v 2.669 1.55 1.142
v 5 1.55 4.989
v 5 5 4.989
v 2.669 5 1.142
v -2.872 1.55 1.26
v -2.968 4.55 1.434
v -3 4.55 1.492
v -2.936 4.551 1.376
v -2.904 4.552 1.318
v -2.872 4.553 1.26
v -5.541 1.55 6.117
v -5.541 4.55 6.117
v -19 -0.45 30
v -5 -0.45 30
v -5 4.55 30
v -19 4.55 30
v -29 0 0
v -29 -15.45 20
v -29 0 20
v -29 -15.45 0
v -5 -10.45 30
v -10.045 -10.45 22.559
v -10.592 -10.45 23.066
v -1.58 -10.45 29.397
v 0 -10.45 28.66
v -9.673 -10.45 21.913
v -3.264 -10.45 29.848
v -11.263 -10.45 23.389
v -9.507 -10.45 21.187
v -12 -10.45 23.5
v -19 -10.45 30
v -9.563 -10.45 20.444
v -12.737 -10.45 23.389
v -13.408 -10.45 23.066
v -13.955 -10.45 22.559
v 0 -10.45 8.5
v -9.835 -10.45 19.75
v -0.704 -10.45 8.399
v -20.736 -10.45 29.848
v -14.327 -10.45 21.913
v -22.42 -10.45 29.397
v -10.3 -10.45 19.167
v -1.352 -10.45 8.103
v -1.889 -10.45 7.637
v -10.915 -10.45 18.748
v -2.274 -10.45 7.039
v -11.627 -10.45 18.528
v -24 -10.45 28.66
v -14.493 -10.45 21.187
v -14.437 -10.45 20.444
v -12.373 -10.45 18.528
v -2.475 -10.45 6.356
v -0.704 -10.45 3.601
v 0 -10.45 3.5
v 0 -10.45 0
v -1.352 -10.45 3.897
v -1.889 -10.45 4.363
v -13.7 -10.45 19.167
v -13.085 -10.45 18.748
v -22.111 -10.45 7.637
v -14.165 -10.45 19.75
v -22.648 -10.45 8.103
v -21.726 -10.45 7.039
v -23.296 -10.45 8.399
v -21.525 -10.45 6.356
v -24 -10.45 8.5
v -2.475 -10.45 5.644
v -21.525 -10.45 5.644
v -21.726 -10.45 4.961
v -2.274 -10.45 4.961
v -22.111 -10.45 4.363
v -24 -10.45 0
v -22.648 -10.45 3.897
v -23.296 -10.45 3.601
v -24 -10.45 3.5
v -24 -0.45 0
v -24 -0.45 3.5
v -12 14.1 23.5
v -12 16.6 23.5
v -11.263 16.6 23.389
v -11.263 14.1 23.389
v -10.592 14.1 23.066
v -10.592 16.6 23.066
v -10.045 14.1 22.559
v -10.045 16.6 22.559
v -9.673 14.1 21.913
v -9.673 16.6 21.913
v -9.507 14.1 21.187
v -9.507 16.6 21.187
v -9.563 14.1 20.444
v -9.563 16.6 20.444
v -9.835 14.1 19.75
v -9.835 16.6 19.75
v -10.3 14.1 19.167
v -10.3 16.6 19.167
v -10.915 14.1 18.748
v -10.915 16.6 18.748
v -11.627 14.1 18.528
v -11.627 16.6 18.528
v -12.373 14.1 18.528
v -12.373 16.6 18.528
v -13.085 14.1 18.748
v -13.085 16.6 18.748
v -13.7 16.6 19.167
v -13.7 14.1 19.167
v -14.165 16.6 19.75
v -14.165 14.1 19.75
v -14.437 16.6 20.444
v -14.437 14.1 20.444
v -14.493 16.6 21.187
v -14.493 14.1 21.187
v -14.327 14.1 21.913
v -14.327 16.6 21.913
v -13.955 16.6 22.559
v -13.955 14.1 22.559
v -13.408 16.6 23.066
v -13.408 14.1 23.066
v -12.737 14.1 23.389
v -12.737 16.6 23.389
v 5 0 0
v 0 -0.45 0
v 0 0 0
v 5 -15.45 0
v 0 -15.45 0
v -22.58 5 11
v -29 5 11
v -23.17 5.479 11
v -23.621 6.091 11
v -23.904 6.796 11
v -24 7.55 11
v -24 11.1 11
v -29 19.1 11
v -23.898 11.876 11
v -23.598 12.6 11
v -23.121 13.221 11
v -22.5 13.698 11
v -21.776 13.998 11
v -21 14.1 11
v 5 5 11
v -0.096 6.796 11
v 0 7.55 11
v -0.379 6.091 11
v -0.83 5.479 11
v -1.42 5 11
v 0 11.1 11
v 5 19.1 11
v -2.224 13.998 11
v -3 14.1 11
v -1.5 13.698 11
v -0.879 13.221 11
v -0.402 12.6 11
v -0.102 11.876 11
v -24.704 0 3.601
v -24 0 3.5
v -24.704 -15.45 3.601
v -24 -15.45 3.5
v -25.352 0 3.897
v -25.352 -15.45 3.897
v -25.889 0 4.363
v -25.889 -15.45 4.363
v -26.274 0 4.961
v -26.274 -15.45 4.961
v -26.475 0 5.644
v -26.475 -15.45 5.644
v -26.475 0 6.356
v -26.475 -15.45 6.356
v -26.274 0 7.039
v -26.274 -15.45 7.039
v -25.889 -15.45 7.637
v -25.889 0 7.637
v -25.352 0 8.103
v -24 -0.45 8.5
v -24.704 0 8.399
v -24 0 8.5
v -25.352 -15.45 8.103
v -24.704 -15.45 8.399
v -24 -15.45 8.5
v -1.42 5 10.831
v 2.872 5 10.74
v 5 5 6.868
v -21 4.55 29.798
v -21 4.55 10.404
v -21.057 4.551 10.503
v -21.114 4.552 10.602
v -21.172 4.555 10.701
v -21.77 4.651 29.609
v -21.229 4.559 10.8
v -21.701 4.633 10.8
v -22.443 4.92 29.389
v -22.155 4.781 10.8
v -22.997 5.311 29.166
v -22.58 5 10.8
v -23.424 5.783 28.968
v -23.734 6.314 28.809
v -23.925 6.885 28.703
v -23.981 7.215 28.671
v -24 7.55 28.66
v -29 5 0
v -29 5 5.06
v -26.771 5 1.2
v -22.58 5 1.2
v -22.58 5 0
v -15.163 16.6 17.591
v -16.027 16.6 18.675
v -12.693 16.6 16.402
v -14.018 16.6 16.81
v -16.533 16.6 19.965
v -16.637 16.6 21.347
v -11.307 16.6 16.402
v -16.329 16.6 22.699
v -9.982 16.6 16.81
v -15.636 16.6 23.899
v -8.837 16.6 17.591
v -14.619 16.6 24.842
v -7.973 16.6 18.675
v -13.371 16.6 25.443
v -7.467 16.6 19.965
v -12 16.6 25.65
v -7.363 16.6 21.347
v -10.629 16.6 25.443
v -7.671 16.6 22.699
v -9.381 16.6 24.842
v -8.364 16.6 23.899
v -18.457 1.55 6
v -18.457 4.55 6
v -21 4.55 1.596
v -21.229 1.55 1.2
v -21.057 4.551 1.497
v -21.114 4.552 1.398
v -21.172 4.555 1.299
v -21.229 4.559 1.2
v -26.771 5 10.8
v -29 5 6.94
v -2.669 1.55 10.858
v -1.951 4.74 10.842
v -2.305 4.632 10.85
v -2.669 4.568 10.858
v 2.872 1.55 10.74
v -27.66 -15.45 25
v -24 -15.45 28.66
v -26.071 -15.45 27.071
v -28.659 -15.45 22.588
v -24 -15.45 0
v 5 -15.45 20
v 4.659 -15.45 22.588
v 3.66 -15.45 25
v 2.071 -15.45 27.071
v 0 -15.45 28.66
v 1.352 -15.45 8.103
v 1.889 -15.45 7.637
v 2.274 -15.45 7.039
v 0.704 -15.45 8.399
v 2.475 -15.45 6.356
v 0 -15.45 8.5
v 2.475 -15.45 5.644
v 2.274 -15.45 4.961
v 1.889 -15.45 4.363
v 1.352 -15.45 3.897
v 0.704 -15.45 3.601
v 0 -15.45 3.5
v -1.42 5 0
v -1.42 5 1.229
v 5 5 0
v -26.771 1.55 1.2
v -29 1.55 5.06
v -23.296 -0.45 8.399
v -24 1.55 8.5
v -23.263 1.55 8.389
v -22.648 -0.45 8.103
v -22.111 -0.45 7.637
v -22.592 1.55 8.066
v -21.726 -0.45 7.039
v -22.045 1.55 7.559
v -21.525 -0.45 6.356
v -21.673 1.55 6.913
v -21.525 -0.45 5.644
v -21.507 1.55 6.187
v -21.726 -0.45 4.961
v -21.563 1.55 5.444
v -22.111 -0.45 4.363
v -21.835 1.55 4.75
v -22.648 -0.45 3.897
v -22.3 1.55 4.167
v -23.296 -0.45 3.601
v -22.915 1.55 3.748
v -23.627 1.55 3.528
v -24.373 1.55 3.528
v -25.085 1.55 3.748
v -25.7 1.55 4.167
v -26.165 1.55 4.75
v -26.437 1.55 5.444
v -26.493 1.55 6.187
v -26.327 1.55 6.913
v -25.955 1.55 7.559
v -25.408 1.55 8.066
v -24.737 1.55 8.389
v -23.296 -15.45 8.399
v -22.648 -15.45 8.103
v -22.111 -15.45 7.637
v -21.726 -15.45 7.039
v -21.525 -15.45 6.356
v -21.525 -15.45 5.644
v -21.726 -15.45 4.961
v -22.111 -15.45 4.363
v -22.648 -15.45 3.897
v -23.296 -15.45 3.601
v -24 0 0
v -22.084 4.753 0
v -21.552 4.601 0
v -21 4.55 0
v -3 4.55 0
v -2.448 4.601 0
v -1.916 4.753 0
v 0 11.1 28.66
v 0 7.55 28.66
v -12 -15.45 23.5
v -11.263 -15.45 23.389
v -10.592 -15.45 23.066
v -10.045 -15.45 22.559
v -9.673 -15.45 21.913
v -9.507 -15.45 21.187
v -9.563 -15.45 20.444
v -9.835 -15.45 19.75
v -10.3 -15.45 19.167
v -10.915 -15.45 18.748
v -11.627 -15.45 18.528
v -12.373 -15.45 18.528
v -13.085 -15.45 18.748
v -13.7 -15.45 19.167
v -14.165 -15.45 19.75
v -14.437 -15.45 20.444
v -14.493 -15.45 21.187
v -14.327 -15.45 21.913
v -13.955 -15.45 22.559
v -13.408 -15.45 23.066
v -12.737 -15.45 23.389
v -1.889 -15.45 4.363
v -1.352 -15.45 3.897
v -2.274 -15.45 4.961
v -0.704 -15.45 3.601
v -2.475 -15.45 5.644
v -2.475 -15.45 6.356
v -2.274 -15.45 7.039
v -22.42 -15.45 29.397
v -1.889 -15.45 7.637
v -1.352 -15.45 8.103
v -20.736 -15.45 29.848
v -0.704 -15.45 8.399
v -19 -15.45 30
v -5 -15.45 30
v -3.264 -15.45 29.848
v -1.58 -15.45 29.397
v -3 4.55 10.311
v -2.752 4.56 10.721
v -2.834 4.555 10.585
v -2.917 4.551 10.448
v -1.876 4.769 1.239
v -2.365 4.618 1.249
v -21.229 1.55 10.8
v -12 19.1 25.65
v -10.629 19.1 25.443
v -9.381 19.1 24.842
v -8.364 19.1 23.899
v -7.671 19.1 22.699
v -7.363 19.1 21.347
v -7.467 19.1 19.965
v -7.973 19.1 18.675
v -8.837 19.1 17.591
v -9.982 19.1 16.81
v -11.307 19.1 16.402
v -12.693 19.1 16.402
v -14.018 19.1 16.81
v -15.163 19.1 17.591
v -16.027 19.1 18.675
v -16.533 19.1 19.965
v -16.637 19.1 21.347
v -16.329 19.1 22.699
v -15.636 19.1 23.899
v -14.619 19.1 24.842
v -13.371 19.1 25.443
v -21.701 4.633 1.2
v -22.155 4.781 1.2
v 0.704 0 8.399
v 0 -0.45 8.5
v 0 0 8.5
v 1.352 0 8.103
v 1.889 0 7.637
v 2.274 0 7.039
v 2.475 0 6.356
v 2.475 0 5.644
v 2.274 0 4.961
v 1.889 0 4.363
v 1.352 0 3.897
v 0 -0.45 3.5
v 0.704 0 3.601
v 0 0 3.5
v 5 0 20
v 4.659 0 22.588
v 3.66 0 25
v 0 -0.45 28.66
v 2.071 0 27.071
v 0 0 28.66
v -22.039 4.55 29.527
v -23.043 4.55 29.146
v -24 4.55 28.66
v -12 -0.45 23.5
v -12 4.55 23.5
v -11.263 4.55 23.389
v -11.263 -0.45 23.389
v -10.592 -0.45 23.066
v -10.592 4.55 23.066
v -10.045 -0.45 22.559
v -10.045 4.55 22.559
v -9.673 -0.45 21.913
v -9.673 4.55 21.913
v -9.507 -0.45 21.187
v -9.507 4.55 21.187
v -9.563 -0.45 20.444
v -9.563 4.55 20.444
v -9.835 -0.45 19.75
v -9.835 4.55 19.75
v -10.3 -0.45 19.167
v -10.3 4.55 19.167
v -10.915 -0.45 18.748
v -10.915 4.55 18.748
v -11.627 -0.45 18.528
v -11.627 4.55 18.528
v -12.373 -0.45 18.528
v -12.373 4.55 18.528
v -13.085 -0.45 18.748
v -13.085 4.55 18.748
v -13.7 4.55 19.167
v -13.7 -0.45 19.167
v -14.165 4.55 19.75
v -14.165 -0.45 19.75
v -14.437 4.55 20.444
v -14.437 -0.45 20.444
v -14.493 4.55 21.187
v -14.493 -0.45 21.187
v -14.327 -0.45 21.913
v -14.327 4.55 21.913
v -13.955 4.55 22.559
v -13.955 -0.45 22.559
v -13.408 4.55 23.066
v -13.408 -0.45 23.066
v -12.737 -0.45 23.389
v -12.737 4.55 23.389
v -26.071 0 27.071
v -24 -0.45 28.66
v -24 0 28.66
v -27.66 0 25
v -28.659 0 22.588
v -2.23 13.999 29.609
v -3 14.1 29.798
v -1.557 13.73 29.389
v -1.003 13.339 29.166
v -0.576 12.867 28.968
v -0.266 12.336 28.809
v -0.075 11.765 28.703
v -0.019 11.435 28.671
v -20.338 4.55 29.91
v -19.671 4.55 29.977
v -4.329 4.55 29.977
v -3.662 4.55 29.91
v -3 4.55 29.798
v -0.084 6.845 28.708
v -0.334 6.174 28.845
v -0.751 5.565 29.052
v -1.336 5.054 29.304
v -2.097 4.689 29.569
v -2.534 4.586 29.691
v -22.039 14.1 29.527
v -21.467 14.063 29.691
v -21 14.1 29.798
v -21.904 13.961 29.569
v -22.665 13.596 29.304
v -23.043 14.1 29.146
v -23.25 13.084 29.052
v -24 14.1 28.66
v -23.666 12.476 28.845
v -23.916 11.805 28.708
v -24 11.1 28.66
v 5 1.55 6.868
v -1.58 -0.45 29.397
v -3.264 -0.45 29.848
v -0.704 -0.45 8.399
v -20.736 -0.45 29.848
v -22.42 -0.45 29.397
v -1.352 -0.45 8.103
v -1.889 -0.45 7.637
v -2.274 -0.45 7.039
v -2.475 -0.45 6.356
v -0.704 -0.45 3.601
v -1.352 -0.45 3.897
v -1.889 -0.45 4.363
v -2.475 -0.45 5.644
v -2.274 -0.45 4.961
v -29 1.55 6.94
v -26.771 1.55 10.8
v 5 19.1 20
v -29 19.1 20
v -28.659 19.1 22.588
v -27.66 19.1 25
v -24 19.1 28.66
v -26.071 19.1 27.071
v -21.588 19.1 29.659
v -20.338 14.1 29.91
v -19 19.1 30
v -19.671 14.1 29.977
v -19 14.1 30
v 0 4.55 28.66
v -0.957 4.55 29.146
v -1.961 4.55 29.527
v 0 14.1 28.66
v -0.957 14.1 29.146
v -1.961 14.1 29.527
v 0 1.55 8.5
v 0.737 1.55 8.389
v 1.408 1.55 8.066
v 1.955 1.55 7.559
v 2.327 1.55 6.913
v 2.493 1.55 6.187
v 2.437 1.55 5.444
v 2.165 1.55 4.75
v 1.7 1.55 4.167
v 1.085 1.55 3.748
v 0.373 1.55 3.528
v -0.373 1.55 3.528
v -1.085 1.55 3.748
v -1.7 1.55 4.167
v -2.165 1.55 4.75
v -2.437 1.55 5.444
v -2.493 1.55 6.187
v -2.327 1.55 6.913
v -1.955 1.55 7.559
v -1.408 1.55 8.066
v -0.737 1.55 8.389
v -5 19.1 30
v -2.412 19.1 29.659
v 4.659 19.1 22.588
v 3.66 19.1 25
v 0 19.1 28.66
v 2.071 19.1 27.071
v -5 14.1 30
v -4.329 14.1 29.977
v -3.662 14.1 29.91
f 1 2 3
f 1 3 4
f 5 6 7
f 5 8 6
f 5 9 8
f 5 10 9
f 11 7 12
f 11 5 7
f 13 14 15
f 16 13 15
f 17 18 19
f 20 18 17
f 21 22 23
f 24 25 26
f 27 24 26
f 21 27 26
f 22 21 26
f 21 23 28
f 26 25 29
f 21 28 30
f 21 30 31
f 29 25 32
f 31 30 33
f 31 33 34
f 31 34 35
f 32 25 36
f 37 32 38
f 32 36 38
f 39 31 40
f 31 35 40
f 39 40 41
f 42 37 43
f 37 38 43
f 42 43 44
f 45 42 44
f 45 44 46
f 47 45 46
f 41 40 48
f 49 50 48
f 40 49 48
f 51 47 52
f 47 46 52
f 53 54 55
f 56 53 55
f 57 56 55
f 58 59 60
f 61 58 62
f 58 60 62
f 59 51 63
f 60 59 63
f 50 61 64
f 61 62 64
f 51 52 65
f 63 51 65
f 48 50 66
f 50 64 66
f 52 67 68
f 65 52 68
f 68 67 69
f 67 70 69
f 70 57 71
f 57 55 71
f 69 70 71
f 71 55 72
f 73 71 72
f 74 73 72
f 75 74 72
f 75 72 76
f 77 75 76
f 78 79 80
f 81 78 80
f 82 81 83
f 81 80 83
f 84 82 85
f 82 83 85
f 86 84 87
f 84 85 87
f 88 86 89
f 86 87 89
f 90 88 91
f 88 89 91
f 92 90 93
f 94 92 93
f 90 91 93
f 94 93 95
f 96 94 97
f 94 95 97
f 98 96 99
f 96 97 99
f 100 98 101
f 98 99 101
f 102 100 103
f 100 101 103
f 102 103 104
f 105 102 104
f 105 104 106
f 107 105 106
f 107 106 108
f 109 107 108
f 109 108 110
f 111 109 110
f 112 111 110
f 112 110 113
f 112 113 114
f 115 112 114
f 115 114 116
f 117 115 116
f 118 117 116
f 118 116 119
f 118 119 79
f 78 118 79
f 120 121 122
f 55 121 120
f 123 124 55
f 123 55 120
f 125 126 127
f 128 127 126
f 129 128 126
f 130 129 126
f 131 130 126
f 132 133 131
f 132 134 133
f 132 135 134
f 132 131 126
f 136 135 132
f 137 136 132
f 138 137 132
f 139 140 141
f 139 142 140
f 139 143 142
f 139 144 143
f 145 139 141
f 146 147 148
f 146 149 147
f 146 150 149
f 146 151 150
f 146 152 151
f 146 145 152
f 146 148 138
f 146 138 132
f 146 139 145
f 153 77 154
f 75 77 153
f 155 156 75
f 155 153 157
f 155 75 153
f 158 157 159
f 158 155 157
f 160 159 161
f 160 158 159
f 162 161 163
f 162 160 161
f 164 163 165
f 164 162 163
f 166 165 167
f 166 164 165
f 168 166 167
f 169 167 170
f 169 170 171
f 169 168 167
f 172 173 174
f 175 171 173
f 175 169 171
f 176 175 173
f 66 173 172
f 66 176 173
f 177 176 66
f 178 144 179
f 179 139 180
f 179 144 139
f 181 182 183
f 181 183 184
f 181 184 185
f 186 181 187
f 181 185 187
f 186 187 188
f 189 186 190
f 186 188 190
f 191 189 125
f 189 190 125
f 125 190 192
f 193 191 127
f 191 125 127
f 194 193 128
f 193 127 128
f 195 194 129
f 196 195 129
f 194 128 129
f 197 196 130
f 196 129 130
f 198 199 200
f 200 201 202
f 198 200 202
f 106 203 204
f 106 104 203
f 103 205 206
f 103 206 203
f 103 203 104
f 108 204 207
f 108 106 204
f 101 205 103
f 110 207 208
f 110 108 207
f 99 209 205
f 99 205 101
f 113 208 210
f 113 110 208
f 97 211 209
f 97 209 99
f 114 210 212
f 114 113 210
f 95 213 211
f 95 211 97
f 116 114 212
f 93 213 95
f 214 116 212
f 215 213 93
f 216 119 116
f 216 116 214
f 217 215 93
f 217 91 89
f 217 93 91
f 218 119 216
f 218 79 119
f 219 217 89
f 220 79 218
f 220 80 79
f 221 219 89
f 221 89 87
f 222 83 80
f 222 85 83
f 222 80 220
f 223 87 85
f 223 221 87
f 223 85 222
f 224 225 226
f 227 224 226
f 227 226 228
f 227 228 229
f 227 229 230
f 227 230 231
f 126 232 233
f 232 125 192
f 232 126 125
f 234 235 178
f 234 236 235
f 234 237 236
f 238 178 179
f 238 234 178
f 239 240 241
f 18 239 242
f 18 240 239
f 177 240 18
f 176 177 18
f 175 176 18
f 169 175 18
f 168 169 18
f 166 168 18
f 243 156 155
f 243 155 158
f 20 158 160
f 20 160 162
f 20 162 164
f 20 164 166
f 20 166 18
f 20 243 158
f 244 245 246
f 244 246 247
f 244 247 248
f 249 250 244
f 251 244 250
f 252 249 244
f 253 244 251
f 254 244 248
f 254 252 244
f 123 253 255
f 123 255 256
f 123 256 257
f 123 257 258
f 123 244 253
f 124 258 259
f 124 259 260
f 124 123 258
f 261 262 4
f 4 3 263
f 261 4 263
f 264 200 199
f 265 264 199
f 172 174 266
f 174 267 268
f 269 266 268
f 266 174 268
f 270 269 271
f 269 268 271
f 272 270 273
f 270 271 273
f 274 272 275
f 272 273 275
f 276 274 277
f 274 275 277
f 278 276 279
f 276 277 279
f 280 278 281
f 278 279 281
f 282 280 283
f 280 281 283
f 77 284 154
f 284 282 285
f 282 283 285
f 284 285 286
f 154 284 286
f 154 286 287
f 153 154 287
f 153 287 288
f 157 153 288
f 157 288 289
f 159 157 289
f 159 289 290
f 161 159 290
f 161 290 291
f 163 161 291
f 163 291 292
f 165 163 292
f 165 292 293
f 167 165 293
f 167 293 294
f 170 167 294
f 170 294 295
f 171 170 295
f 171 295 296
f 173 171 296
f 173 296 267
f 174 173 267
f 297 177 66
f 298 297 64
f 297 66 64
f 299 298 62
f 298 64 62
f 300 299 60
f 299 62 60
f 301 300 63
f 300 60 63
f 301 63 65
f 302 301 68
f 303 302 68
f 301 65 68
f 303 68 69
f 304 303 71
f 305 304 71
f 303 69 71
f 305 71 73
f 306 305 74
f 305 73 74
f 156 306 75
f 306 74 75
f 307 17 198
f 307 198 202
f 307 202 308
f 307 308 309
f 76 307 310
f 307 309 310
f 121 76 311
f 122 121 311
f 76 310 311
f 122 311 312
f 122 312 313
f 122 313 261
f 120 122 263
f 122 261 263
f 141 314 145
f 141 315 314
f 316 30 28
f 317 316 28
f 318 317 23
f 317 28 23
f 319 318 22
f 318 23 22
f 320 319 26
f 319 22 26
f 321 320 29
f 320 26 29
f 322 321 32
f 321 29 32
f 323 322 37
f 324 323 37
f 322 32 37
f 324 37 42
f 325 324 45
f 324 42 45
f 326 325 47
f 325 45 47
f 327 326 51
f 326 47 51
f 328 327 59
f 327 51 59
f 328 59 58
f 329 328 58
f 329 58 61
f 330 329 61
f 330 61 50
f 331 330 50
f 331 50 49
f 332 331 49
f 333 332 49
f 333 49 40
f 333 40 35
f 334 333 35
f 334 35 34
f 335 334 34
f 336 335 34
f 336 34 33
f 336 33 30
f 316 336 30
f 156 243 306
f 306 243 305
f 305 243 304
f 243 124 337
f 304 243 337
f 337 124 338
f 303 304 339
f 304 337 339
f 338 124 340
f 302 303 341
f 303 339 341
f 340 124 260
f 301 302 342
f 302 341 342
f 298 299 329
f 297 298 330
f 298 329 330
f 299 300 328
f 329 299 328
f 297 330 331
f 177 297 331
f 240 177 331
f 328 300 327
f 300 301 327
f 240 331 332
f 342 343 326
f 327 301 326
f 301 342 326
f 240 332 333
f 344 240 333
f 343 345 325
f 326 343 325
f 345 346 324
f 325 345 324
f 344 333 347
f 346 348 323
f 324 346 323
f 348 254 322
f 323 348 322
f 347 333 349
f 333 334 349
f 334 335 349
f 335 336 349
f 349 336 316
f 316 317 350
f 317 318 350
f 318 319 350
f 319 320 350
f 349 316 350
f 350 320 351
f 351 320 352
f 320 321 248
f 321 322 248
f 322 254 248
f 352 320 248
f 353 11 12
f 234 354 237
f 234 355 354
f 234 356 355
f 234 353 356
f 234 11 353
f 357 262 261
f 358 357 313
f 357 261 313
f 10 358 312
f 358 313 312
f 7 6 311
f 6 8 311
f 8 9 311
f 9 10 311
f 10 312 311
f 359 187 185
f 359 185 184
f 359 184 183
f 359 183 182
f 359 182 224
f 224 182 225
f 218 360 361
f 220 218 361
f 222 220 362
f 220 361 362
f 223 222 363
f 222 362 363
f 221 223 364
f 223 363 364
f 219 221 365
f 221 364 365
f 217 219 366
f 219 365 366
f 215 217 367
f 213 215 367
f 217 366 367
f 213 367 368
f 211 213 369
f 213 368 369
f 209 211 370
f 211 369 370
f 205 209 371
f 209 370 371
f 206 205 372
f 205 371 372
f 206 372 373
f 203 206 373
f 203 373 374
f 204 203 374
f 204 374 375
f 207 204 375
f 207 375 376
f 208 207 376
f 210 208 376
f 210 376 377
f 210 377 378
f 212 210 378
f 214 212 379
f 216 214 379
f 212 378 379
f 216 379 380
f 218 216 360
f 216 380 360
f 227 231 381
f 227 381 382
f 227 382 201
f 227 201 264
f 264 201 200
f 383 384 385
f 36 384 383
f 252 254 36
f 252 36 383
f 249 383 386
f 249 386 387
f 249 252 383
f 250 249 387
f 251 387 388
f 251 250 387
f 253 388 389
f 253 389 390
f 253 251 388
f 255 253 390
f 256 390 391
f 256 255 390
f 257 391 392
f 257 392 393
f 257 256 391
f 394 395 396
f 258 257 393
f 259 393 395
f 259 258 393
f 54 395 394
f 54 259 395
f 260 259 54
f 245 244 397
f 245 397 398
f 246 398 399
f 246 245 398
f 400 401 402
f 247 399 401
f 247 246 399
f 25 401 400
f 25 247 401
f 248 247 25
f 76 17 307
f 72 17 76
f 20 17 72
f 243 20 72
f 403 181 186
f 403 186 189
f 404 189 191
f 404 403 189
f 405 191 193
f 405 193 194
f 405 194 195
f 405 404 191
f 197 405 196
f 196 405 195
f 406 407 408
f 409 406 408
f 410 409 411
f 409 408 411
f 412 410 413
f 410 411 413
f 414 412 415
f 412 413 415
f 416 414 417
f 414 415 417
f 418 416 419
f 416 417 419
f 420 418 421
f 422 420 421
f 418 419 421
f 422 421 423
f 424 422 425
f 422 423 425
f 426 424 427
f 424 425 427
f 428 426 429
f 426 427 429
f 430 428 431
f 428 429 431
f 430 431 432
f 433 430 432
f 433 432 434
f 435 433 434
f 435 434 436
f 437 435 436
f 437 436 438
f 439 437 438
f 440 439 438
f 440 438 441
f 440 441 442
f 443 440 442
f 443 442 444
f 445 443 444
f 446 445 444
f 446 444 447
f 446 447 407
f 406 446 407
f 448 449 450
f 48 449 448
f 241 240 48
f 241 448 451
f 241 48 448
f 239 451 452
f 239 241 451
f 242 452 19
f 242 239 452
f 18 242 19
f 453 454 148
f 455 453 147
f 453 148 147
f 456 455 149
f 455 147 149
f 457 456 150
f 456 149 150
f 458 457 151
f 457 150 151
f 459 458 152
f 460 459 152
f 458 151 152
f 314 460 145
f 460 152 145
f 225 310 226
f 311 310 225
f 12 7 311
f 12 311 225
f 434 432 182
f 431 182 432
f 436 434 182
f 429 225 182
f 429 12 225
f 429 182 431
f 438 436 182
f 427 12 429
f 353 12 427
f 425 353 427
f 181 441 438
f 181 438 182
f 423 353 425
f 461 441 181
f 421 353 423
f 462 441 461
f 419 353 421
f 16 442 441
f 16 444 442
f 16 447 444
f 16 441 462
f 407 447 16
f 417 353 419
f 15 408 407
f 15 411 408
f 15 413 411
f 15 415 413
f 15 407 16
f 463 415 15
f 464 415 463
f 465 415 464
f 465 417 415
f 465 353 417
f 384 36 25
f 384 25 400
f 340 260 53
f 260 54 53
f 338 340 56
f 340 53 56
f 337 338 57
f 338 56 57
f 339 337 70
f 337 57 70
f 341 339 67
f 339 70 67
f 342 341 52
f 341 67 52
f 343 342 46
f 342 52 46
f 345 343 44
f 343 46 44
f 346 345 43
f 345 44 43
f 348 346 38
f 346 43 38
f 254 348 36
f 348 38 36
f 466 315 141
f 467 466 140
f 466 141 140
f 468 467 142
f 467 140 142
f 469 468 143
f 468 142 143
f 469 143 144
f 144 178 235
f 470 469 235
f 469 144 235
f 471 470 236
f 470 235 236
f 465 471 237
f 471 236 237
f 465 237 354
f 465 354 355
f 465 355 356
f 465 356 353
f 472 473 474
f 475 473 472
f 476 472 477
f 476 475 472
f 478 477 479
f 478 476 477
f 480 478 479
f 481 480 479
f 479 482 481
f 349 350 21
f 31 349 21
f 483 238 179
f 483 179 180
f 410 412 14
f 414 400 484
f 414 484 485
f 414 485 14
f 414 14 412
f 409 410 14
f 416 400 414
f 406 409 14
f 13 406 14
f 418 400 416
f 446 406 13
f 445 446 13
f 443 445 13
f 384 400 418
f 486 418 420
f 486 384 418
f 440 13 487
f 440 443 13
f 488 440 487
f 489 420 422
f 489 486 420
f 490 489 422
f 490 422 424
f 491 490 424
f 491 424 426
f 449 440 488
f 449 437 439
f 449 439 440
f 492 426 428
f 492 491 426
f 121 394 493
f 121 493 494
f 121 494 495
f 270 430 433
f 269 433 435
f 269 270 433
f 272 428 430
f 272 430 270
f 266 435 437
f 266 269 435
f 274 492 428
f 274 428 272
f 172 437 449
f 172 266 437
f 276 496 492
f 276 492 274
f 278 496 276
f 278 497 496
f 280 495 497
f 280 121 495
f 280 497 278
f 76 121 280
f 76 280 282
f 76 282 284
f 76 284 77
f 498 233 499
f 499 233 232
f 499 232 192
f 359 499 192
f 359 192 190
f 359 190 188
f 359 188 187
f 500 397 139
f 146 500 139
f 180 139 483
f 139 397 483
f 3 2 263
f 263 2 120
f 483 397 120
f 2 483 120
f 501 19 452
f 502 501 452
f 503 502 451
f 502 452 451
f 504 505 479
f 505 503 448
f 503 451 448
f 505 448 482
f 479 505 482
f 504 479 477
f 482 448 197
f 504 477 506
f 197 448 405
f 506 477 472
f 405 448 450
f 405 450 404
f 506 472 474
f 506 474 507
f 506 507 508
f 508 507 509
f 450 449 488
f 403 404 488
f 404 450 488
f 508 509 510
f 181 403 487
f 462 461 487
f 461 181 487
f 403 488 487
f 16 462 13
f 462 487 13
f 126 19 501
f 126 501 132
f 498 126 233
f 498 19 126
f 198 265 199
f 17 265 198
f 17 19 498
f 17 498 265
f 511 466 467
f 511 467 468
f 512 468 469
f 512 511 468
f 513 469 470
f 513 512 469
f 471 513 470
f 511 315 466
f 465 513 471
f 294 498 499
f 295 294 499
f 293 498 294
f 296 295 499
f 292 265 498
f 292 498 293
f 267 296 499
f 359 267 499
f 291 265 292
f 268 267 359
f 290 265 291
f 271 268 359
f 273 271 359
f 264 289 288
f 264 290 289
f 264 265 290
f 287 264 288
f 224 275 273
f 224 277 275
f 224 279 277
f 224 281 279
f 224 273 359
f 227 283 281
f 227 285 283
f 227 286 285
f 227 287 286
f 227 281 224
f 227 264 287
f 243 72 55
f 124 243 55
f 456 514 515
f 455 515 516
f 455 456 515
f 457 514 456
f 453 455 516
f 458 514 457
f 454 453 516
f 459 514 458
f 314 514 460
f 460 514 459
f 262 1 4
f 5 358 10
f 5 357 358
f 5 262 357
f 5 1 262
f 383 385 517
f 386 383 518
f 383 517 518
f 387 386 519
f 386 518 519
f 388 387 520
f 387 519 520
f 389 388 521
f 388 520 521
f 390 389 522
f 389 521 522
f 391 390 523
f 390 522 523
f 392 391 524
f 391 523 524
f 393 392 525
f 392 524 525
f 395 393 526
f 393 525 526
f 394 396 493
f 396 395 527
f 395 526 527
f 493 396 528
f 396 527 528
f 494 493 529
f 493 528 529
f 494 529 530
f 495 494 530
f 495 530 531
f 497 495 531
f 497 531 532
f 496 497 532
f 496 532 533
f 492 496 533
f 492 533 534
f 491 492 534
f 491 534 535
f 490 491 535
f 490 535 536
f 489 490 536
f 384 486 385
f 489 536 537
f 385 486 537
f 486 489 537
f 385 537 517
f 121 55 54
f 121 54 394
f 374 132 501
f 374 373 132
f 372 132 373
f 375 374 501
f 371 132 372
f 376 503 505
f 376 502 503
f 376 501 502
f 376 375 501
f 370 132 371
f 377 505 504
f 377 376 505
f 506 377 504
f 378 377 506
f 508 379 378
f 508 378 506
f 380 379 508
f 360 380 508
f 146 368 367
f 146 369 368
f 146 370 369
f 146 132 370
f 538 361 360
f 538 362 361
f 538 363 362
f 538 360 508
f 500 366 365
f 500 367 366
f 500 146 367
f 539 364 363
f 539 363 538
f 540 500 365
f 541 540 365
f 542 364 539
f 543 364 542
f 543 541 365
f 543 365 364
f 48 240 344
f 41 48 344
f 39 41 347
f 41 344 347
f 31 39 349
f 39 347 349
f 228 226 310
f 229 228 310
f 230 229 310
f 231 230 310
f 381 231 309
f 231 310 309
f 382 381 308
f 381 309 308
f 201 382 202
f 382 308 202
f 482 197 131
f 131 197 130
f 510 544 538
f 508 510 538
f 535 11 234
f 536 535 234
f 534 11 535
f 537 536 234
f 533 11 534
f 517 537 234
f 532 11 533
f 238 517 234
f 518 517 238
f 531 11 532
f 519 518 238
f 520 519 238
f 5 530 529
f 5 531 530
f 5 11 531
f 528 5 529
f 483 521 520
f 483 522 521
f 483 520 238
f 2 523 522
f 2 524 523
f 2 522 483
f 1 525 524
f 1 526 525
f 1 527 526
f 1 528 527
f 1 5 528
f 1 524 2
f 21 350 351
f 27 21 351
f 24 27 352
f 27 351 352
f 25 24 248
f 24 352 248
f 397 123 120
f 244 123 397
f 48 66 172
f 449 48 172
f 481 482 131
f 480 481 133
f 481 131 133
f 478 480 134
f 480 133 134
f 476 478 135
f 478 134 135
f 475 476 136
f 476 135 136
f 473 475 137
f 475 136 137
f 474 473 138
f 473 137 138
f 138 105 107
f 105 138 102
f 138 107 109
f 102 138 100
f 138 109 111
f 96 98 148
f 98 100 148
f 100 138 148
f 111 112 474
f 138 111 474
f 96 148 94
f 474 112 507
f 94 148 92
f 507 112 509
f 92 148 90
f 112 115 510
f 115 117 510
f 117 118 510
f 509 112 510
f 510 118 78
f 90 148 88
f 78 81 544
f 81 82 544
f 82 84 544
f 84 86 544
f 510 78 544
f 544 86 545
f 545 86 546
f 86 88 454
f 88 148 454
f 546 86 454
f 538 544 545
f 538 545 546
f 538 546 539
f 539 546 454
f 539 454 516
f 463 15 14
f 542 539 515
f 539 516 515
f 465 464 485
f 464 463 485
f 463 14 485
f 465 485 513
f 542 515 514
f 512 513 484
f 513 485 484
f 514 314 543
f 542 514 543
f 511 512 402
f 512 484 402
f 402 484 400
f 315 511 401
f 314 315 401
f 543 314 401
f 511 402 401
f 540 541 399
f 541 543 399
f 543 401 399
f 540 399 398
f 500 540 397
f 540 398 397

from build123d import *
from build123d.topology import SkipClean

# Parameters (mm, degrees)
CROQUIS1_W                = 5
CROQUIS1_H                = 30
SALIENTE_EXTRUIR1_DEPTH   = 19.1
SALIENTE_EXTRUIR1_2_DEPTH = 19.1
CROQUIS2_W                = 30
CROQUIS2_H                = 5
CROQUIS2_H_2              = 20
SALIENTE_EXTRUIR2_DEPTH   = 24
CORTAR_EXTRUIR1_REACH     = 56.173
CROQUIS3_R                = 2.5
CROQUIS4_R                = 4.65
CORTAR_EXTRUIR2_DEPTH     = 2.5
REDONDEO1_R               = 10
CORTAR_EXTRUIR8_REACH     = 48.271
CROQUIS12_R               = 2.5
REDONDEO2_DEPTH           = 29.797959071
REDONDEO2_START           = 4.55
REDONDEO2_2_DEPTH         = 6.55
REDONDEO2_START_2         = 7.549995607
REDONDEO2_3_DEPTH         = 6.550004393
CORTAR_EXTRUIR10_DEPTH    = 3
CROQUIS15_W               = 11
CROQUIS15_H               = 6
CORTAR_EXTRUIR11_DEPTH    = 34
CORTAR_EXTRUIR14_REACH    = 48.271
CROQUIS17_R               = 2.5
CROQUIS18_W               = 11
CROQUIS18_H               = 8.1
CORTAR_EXTRUIR15_DEPTH    = 34
SALIENTE_EXTRUIR3_REACH   = 56.173
CORTAR_EXTRUIR16_REACH    = 47.889
CROQUIS20_W               = 24
CROQUIS20_H               = 10


with BuildPart() as part:
    # Croquis1 → Saliente-Extruir1 (new body)
    with BuildSketch(Plane(origin=(0, 0, 0), x_dir=(1, 0, 0), z_dir=(0, 1, 0))):
        with Locations((2.5, -15)):
            Rectangle(CROQUIS1_W, CROQUIS1_H)
    extrude(amount=SALIENTE_EXTRUIR1_DEPTH)



with BuildPart() as body_2:
    # Croquis1 → Saliente-Extruir1 2 (new body)
    with BuildSketch(Plane(origin=(0, 0, 0), x_dir=(1, 0, 0), z_dir=(0, 1, 0))):
        with Locations((-26.5, -15)):
            Rectangle(CROQUIS1_W, CROQUIS1_H)
    extrude(amount=SALIENTE_EXTRUIR1_2_DEPTH)


with BuildPart() as part_1:
    add(part.part)

    add(body_2.part)  # Saliente-Extruir2 merges body 2
    # Croquis2 → Saliente-Extruir2 (add)
    with BuildSketch(Plane.ZY):
        with Locations((15, 16.6)):
            Rectangle(CROQUIS2_W, CROQUIS2_H)
        with Locations((15, -5.45)):
            Rectangle(CROQUIS2_W, CROQUIS2_H_2)
    extrude(amount=SALIENTE_EXTRUIR2_DEPTH)

    # Croquis3 → Cortar-Extruir1 (cut, up to next)
    with BuildSketch(Plane(origin=(0, 19.1, 0), x_dir=(1, 0, 0), z_dir=(0, 1, 0)), mode=Mode.PRIVATE) as cortar_extruir1_sk1:
        with Locations(Location((-12, -21, 0), (0, 0, 270))):
            Circle(CROQUIS3_R)
    cortar_extruir1_tool1 = extrude(cortar_extruir1_sk1.sketch, amount=-CORTAR_EXTRUIR1_REACH, mode=Mode.PRIVATE) & part_1.part
    add(cortar_extruir1_tool1.solids().sort_by_distance((-12, 19.1, 21))[0], mode=Mode.SUBTRACT)

    # Croquis4 → Cortar-Extruir2 (cut)
    with BuildSketch(Plane(origin=(0, 19.1, 0), x_dir=(1, 0, 0), z_dir=(0, 1, 0))):
        with Locations(Location((-12, -21, 0), (0, 0, 270))):
            Circle(CROQUIS4_R)
    extrude(amount=-CORTAR_EXTRUIR2_DEPTH, mode=Mode.SUBTRACT)

    # Redondeo1
    # the kernel refuses this fillet: 10 mm, written as the material it takes off along each edge
    with BuildSketch(Plane(origin=(-29, -25, 30), x_dir=(1, 0, 0), z_dir=(0, 1, 0)), Plane(origin=(5, -25, 30), x_dir=(0, 0, -1), z_dir=(0, 1, 0))) as redondeo1_piece_1:
        with BuildLine():
            CenterArc((REDONDEO1_R, REDONDEO1_R), REDONDEO1_R, 180, 90)
            Line((0, REDONDEO1_R), (0, 0))
            Line((0, 0), (REDONDEO1_R, 0))
        make_face()
    extrude(amount=69.1, mode=Mode.SUBTRACT)

    # Cortar-Extruir8: up to this face of the body (flat: up to its plane)
    cortar_extruir8_end = Plane(part_1.part.faces().sort_by_distance((-12, -15.45, 14.911465184))[0])
    # Croquis12 → Cortar-Extruir8 (cut, up to the picked face)
    with BuildSketch(Plane(origin=(0, 4.55, 0), x_dir=(1, 0, 0), z_dir=(0, 1, 0)), mode=Mode.PRIVATE) as cortar_extruir8_sk1:
        with Locations(Location((-24, -6, 0), (0, 0, 270))):
            Circle(CROQUIS12_R)
    cortar_extruir8_tool1 = split(extrude(cortar_extruir8_sk1.sketch, amount=-CORTAR_EXTRUIR8_REACH, mode=Mode.PRIVATE), bisect_by=cortar_extruir8_end, keep=Keep.BOTH, mode=Mode.PRIVATE)
    # Croquis12 → Cortar-Extruir8 (cut, up to the picked face)
    with BuildSketch(Plane(origin=(0, 4.55, 0), x_dir=(1, 0, 0), z_dir=(0, 1, 0)), mode=Mode.PRIVATE) as cortar_extruir8_sk2:
        with Locations(Location((0, -6, 0), (0, 0, 270))):
            Circle(CROQUIS12_R)
    cortar_extruir8_tool2 = split(extrude(cortar_extruir8_sk2.sketch, amount=-CORTAR_EXTRUIR8_REACH, mode=Mode.PRIVATE), bisect_by=cortar_extruir8_end, keep=Keep.BOTH, mode=Mode.PRIVATE)
    add(cortar_extruir8_tool1.solids().sort_by(Axis((-24, 4.55, 6), (0, -1, 0)))[0], mode=Mode.SUBTRACT)
    add(cortar_extruir8_tool2.solids().sort_by(Axis((0, 4.55, 6), (0, -1, 0)))[0], mode=Mode.SUBTRACT)

    # Redondeo2: read off the stored shape, not the designer's step
    # Redondeo2 outline → Redondeo2 (add)
    with BuildSketch(Plane.XY):
        with BuildLine():
            Line((-24, 14.1), (-24, 11.1))
            ThreePointArc((-24, 11.1), (-23.121320344, 13.221320344), (-21, 14.1))
            Line((-21, 14.1), (-24, 14.1))
        make_face()
        with BuildLine():
            ThreePointArc((-21, 4.55), (-23.121320344, 5.428679656), (-24, 7.55))
            Line((-24, 7.55), (-24, 4.55))
            Line((-24, 4.55), (-21, 4.55))
        make_face()
        with BuildLine():
            Line((0, 14.1), (-3, 14.1))
            ThreePointArc((-3, 14.1), (-0.878679656, 13.221320344), (0, 11.1))
            Line((0, 11.1), (0, 14.1))
        make_face()
        with BuildLine():
            ThreePointArc((0, 7.55), (-0.878679656, 5.428679656), (-3, 4.55))
            Line((-3, 4.55), (0, 4.55))
            Line((0, 4.55), (0, 7.55))
        make_face()
    extrude(amount=REDONDEO2_DEPTH)

    # Redondeo2 2 outline → Redondeo2 2 (cut)
    with BuildSketch(Plane(origin=(0, 0, 0), x_dir=(1, 0, 0), z_dir=(0, 1, 0)).offset(REDONDEO2_START)):
        with BuildLine():
            ThreePointArc((-24, -8.5), (-21.5, -6), (-24, -3.5))
            Line((-24, -3.5), (-24, -8.5))
        make_face()
        with BuildLine():
            ThreePointArc((-20.99999998, -29.797958975), (-22.545926263, -29.350208925), (-24, -28.660254038))
            Line((-24, -28.660254038), (-24, -29.797959071))
            Line((-24, -29.797959071), (-20.99999998, -29.797958975))
        make_face()
        with BuildLine():
            Line((0, -29.797959071), (0, -28.660254038))
            ThreePointArc((0, -28.660254038), (-1.454073737, -29.350208925), (-3.00000002, -29.797958975))
            Line((-3.00000002, -29.797958975), (0, -29.797959071))
        make_face()
        with BuildLine():
            Line((0, -8.5), (0, -3.5))
            ThreePointArc((0, -3.5), (-2.5, -6), (0, -8.5))
        make_face()
    extrude(amount=REDONDEO2_2_DEPTH, mode=Mode.SUBTRACT)

    # Redondeo2 3 outline → Redondeo2 3 (cut)
    with BuildSketch(Plane(origin=(0, 0, 0), x_dir=(1, 0, 0), z_dir=(0, 1, 0)).offset(REDONDEO2_START_2)):
        with BuildLine():
            ThreePointArc((-20.99999998, -29.797958975), (-22.545926263, -29.350208925), (-24, -28.660254038))
            Line((-24, -28.660254038), (-24, -29.797959071))
            Line((-24, -29.797959071), (-20.99999998, -29.797958975))
        make_face()
        with BuildLine():
            Line((0, -29.797959071), (0, -28.660254038))
            ThreePointArc((0, -28.660254038), (-1.454073737, -29.350208925), (-3.00000002, -29.797958975))
            Line((-3.00000002, -29.797958975), (0, -29.797959071))
        make_face()
    extrude(amount=REDONDEO2_3_DEPTH, mode=Mode.SUBTRACT)

    # Croquis14 → Cortar-Extruir10 (cut, symmetric)
    with SkipClean():  # the faces are left unmerged after this step: merging them gives an invalid solid
        with BuildSketch(Plane(origin=(0, 4.55, 0), x_dir=(1, 0, 0), z_dir=(0, 1, 0))):
            Polygon((-5.541319679, -6.117372146), (-2.669012579, -10.857609685), (2.872307099, -10.740237539), (5.541319679, -5.882627854), (2.669012579, -1.142390315), (-2.872307099, -1.259762461), align=None)
            Polygon((-18.457437416, -6), (-21.228718708, -1.2), (-26.771281292, -1.2), (-29.542562584, -6), (-26.771281292, -10.8), (-21.228718708, -10.8), align=None)
        extrude(amount=CORTAR_EXTRUIR10_DEPTH, both=True, mode=Mode.SUBTRACT)

    # Croquis15 → Cortar-Extruir11 (cut)
    with BuildSketch(Plane(origin=(5, 0, 0), x_dir=(0, 0, -1), z_dir=(1, 0, 0))):
        with Locations((-5.5, 8)):
            Rectangle(CROQUIS15_W, CROQUIS15_H)
    extrude(amount=-CORTAR_EXTRUIR11_DEPTH, mode=Mode.SUBTRACT)

    # Croquis17 → Cortar-Extruir14 (cut, up to next)
    with BuildSketch(Plane(origin=(0, 4.55, 0), x_dir=(1, 0, 0), z_dir=(0, 1, 0)), mode=Mode.PRIVATE) as cortar_extruir14_sk1:
        with Locations(Location((-12, -21, 0), (0, 0, 270))):
            Circle(CROQUIS17_R)
    cortar_extruir14_tool1 = extrude(cortar_extruir14_sk1.sketch, amount=-CORTAR_EXTRUIR14_REACH, mode=Mode.PRIVATE) & part_1.part
    add(cortar_extruir14_tool1.solids().sort_by_distance((-12, 4.55, 21))[0], mode=Mode.SUBTRACT)

    # Croquis18 → Cortar-Extruir15 (cut)
    with BuildSketch(Plane(origin=(5, 0, 0), x_dir=(0, 0, -1), z_dir=(1, 0, 0))):
        with Locations((-5.5, 15.05)):
            Rectangle(CROQUIS18_W, CROQUIS18_H)
    extrude(amount=-CORTAR_EXTRUIR15_DEPTH, mode=Mode.SUBTRACT)

    # Croquis19 → Saliente-Extruir3 (add, up to next)
    with BuildSketch(Plane(origin=(0, -15.45, 0), x_dir=(-1, 0, 0), z_dir=(0, -1, 0)), mode=Mode.PRIVATE) as saliente_extruir3_sk1:
        with BuildLine():
            Line((0, -28.660254038), (0, -8.5))
            ThreePointArc((0, -8.5), (-2.5, -6), (0, -3.5))
            Line((0, -3.5), (0, 0))
            Line((0, 0), (-5, 0))
            Line((-5, 0), (-5, -20))
            ThreePointArc((-5, -20), (-3.660254038, -25), (0, -28.660254038))
        make_face()
    saliente_extruir3_tool1 = extrude(saliente_extruir3_sk1.sketch, amount=-SALIENTE_EXTRUIR3_REACH, mode=Mode.PRIVATE) - part_1.part
    # Croquis19 → Saliente-Extruir3 (add, up to next)
    with BuildSketch(Plane(origin=(0, -15.45, 0), x_dir=(-1, 0, 0), z_dir=(0, -1, 0)), mode=Mode.PRIVATE) as saliente_extruir3_sk2:
        with BuildLine():
            Line((24, -8.5), (24, -28.660254038))
            ThreePointArc((24, -28.660254038), (27.660254038, -25), (29, -20))
            Line((29, -20), (29, 0))
            Line((29, 0), (24, 0))
            Line((24, 0), (24, -3.5))
            ThreePointArc((24, -3.5), (26.5, -6), (24, -8.5))
        make_face()
    saliente_extruir3_tool2 = extrude(saliente_extruir3_sk2.sketch, amount=-SALIENTE_EXTRUIR3_REACH, mode=Mode.PRIVATE) - part_1.part
    add(saliente_extruir3_tool1.solids().sort_by_distance((2.502598, -15.45, 13.726714))[0])
    add(saliente_extruir3_tool2.solids().sort_by_distance((-26.502598, -15.45, 13.726714))[0])

    # Croquis20 → Cortar-Extruir16 (cut, up to next)
    with BuildSketch(Plane(origin=(0, 0, 0), x_dir=(-1, 0, 0), z_dir=(0, 0, -1)), mode=Mode.PRIVATE) as cortar_extruir16_sk1:
        with Locations((12, -5.45)):
            Rectangle(CROQUIS20_W, CROQUIS20_H)
    cortar_extruir16_tool1 = extrude(cortar_extruir16_sk1.sketch, amount=-CORTAR_EXTRUIR16_REACH, mode=Mode.PRIVATE) & part_1.part
    add(cortar_extruir16_tool1.solids().sort_by_distance((-12, -5.45, 0))[0], mode=Mode.SUBTRACT)


solid = part_1.part
